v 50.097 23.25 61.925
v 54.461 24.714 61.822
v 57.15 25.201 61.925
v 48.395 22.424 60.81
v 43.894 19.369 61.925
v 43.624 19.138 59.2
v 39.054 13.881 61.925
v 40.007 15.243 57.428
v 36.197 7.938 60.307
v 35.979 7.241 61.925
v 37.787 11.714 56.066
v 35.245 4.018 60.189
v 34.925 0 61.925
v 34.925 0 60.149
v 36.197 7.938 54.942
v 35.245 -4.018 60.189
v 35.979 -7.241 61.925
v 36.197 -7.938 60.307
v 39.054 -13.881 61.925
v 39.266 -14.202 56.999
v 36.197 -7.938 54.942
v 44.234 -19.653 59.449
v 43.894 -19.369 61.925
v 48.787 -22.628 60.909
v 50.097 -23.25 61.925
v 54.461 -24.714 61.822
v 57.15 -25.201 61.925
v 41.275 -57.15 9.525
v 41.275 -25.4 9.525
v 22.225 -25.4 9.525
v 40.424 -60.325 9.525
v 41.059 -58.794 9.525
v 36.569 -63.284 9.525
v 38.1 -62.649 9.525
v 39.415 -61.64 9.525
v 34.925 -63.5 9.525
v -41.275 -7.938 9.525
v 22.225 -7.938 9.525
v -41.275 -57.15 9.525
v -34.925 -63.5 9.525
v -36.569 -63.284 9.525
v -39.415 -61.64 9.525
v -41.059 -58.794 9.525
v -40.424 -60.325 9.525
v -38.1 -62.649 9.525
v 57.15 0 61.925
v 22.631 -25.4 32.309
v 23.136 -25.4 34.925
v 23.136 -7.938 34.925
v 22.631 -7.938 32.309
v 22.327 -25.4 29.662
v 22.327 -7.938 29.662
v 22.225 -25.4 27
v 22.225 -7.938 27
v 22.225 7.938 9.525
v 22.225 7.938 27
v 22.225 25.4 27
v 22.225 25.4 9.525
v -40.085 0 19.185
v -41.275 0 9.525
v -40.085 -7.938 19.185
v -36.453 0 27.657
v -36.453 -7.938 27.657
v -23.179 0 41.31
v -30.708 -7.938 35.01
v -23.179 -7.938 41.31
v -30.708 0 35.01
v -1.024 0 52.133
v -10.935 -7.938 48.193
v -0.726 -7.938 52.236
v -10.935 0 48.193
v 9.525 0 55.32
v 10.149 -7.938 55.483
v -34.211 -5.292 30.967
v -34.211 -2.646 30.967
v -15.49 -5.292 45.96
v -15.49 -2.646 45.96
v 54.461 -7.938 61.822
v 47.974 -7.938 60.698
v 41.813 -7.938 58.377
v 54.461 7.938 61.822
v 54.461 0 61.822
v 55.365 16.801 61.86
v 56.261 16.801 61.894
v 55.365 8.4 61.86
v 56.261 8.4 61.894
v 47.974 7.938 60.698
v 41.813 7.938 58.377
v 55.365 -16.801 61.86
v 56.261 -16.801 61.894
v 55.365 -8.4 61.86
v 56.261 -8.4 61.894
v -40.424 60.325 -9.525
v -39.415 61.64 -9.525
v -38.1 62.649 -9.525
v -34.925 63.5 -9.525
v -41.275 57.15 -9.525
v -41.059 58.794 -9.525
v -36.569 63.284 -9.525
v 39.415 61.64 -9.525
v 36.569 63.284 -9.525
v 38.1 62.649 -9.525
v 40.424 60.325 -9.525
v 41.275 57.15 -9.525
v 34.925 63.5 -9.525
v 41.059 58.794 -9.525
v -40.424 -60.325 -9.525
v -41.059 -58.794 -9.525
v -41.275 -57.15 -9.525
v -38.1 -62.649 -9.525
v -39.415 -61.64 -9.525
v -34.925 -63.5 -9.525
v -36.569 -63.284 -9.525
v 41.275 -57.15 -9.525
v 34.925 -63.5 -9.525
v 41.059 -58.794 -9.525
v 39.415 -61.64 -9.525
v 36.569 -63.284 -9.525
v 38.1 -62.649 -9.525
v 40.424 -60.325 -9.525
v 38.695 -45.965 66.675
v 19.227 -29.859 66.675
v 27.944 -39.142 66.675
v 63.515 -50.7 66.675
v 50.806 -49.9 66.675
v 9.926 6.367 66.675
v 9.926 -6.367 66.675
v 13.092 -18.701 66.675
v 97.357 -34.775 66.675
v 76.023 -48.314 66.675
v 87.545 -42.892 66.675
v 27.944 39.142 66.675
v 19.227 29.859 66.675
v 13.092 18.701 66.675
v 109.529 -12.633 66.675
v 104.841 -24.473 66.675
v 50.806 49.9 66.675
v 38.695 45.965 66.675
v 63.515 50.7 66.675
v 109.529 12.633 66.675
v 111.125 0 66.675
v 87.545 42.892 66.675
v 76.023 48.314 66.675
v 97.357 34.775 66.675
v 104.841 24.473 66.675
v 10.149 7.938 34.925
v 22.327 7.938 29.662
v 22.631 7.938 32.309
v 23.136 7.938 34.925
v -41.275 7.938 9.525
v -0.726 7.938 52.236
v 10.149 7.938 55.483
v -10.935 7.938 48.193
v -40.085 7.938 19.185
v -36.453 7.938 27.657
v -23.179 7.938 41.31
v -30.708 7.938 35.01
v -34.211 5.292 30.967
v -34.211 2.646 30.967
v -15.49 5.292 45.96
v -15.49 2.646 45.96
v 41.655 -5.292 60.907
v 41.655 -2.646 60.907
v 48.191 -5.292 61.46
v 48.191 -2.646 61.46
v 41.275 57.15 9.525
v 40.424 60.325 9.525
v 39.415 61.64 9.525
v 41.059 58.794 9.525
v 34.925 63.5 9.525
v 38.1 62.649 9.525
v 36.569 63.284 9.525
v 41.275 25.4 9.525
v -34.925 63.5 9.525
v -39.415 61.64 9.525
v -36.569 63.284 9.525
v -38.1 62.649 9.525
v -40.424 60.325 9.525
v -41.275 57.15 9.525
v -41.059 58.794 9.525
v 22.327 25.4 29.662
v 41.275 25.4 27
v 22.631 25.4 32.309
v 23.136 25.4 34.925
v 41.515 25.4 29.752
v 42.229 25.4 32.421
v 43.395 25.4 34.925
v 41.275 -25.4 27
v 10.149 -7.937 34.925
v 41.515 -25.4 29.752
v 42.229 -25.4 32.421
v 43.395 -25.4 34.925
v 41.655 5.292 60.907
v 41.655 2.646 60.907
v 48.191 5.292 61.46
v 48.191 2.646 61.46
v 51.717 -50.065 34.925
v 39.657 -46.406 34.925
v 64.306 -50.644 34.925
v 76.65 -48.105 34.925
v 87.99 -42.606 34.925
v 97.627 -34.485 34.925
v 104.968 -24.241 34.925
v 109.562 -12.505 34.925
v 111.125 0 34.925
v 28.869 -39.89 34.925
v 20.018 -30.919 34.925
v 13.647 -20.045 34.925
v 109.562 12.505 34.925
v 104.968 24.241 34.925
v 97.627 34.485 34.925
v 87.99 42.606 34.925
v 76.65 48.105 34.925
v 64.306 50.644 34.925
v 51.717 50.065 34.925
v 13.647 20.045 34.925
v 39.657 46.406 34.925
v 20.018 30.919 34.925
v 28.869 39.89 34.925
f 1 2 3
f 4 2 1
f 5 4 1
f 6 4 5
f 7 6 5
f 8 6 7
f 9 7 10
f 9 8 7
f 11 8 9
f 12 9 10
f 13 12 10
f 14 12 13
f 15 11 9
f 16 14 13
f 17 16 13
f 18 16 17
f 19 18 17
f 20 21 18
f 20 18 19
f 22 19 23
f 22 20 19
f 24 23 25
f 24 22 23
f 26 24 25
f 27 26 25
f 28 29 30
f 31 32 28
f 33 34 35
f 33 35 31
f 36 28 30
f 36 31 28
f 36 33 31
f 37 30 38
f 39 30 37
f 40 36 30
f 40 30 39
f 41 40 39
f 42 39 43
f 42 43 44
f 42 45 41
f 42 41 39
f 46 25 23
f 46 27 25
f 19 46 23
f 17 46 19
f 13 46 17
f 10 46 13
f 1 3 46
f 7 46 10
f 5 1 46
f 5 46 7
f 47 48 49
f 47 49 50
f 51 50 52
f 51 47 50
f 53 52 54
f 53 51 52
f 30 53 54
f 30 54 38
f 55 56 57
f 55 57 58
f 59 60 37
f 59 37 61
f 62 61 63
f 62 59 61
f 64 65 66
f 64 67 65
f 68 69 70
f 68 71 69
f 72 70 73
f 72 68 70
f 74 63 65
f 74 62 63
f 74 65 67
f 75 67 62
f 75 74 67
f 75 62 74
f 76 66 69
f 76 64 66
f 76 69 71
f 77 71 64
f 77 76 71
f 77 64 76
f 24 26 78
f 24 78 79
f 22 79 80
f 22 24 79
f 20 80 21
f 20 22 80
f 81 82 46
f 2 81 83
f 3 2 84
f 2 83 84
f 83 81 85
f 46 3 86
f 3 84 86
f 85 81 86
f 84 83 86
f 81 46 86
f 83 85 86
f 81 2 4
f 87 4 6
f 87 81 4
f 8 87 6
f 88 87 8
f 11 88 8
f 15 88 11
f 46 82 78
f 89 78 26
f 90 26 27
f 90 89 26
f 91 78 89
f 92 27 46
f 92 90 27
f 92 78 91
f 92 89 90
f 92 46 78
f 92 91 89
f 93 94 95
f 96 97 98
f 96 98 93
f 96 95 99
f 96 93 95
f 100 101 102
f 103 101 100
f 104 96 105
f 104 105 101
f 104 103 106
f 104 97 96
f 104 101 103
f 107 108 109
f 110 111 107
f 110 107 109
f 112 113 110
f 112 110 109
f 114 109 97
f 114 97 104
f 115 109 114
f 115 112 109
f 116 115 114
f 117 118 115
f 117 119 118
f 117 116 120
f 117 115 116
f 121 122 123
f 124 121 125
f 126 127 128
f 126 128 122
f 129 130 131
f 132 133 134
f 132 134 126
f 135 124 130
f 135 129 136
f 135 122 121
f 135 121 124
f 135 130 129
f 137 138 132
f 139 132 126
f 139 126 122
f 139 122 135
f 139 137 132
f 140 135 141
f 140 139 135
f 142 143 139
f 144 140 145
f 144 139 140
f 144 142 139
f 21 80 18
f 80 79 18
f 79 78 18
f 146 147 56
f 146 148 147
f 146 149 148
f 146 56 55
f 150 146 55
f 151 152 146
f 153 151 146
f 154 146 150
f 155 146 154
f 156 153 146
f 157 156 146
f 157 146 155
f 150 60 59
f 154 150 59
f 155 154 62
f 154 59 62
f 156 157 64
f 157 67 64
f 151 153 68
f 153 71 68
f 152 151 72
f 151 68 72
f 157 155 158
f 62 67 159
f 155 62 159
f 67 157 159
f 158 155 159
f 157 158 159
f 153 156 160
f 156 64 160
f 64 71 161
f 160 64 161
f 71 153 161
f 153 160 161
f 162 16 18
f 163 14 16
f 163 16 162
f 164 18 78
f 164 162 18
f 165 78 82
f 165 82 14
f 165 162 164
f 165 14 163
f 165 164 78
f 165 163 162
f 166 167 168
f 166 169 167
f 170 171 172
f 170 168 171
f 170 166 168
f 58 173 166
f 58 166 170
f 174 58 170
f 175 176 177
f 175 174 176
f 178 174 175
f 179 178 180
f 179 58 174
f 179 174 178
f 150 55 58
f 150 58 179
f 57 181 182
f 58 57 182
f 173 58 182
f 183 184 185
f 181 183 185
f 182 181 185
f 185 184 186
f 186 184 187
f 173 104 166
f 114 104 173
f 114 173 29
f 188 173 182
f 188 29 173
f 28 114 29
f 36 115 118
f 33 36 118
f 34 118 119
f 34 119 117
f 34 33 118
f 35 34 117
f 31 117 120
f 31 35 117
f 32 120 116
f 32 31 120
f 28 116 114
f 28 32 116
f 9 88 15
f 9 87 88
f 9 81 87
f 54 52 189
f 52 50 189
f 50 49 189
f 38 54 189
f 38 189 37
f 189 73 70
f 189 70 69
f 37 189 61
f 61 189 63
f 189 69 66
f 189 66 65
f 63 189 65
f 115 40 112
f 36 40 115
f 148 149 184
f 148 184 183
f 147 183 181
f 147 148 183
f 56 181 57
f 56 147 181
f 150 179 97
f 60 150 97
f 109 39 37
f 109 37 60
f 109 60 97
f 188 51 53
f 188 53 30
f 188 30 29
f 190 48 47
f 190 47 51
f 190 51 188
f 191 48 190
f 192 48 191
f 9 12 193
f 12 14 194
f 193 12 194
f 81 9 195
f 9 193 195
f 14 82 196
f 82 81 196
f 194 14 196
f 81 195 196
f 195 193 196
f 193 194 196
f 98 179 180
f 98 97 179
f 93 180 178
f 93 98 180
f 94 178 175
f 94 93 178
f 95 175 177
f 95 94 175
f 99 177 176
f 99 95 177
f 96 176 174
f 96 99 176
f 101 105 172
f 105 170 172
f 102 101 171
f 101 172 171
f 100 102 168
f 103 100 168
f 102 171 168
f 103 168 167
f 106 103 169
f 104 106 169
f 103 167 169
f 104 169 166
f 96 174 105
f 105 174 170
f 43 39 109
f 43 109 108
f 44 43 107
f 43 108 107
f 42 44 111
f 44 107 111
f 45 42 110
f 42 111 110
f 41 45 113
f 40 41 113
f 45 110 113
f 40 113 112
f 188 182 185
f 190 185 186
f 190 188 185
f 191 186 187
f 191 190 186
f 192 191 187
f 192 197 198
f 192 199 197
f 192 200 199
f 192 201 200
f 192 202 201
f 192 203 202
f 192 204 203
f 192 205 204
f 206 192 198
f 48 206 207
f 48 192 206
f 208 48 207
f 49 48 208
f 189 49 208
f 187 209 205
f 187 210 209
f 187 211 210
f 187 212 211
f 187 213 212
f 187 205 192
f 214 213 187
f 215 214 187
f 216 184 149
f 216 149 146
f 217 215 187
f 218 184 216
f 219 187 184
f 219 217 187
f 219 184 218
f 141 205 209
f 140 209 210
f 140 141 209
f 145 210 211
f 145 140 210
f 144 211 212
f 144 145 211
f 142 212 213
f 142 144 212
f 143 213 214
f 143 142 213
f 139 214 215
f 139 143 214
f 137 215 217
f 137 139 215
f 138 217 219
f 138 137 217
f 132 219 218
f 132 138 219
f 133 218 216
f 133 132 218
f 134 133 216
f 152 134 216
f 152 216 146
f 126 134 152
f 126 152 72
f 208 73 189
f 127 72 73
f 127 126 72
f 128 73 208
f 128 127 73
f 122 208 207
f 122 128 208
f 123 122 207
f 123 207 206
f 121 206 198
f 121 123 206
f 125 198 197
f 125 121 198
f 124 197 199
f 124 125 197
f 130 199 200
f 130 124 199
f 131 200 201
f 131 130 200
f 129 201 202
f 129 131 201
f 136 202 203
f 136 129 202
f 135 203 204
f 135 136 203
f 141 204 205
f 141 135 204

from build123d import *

# Parameters (mm, degrees)
F1_DEPTH = 63.5
F0_W     = 25.4
F0_H     = 19.05
F2_DEPTH = 25.4
F3_DEPTH = 7.9375
F4_R     = 6.35


with BuildPart() as f1:
    # F0 (on Front) → F1 (new body, symmetric)
    with BuildSketch(Plane.XZ):
        Polygon((22.225, 9.525), (-41.275, 9.525), (-41.275, -9.525), (41.275, -9.525), (41.275, 9.525), align=None)
    extrude(amount=F1_DEPTH, both=True)

    # F0 (on Front) → F2 (join, symmetric)
    with BuildSketch(Plane.XZ):
        with BuildLine():
            Line((22.225, 27.0002), (22.225, 9.525))
            Line((22.225, 9.525), (41.275, 9.525))
            Line((41.275, 9.525), (41.275, 27.0002))
            ThreePointArc((41.275, 27.0002), (45.92468, 38.22552), (57.15, 42.8752))
            Line((57.15, 42.8752), (60.325, 42.8752))
            Line((60.325, 42.8752), (60.325, 61.9252))
            Line((60.325, 61.9252), (57.15, 61.9252))
            add(Edge.make_bspline(
                [(54.461055, 61.821533), (55.368857, 61.861839), (56.265521, 61.896322), (57.15, 61.9252)],
                knots=[108.919316, 108.919316, 108.919316, 108.919316, 111.504536, 111.504536, 111.504536, 111.504536], degree=3))
            ThreePointArc((54.461055, 61.821533), (31.521236, 50.72618), (22.225, 27.0002))
        make_face()
        with Locations((73.025, 52.4002)):
            Rectangle(F0_W, F0_H)
    extrude(amount=F2_DEPTH, both=True)

    # F0 (on Front) → F3 (join, symmetric)
    with BuildSketch(Plane.XZ):
        with BuildLine():
            add(Edge.make_bspline(
                [(-41.275, 9.525), (-41.804163, 48.089928), (16.213946, 60.123374), (54.461055, 61.821533)],
                knots=[0, 0, 0, 0, 108.919316, 108.919316, 108.919316, 108.919316], degree=3))
            Line((-41.275, 9.525), (22.225, 9.525))
            Line((22.225, 9.525), (22.225, 27.0002))
            ThreePointArc((22.225, 27.0002), (31.521236, 50.72618), (54.461055, 61.821533))
        make_face()
    extrude(amount=F3_DEPTH, both=True)

    # F4
    f4_edges = [f1.edges().sort_by_distance(p)[0] for p in [
        (-41.275, -63.5, 0),
        (41.275, -63.5, 0),
        (41.275, 63.5, 0),
        (-41.275, 63.5, 0),
    ]]
    fillet(f4_edges, radius=F4_R)

    # F0 (on Front) → F5 (revolve)
    with BuildSketch(Plane.XZ):
        Polygon((60.325, 66.675), (60.325, 61.9252), (85.725, 61.9252), (85.725, 42.8752), (60.325, 42.8752), (60.325, 34.925), (111.125, 34.925), (111.125, 66.675), align=None)
    revolve(axis=Axis((60.325, 0, 50.8), (0, 0, 1)))


solid = f1.part
